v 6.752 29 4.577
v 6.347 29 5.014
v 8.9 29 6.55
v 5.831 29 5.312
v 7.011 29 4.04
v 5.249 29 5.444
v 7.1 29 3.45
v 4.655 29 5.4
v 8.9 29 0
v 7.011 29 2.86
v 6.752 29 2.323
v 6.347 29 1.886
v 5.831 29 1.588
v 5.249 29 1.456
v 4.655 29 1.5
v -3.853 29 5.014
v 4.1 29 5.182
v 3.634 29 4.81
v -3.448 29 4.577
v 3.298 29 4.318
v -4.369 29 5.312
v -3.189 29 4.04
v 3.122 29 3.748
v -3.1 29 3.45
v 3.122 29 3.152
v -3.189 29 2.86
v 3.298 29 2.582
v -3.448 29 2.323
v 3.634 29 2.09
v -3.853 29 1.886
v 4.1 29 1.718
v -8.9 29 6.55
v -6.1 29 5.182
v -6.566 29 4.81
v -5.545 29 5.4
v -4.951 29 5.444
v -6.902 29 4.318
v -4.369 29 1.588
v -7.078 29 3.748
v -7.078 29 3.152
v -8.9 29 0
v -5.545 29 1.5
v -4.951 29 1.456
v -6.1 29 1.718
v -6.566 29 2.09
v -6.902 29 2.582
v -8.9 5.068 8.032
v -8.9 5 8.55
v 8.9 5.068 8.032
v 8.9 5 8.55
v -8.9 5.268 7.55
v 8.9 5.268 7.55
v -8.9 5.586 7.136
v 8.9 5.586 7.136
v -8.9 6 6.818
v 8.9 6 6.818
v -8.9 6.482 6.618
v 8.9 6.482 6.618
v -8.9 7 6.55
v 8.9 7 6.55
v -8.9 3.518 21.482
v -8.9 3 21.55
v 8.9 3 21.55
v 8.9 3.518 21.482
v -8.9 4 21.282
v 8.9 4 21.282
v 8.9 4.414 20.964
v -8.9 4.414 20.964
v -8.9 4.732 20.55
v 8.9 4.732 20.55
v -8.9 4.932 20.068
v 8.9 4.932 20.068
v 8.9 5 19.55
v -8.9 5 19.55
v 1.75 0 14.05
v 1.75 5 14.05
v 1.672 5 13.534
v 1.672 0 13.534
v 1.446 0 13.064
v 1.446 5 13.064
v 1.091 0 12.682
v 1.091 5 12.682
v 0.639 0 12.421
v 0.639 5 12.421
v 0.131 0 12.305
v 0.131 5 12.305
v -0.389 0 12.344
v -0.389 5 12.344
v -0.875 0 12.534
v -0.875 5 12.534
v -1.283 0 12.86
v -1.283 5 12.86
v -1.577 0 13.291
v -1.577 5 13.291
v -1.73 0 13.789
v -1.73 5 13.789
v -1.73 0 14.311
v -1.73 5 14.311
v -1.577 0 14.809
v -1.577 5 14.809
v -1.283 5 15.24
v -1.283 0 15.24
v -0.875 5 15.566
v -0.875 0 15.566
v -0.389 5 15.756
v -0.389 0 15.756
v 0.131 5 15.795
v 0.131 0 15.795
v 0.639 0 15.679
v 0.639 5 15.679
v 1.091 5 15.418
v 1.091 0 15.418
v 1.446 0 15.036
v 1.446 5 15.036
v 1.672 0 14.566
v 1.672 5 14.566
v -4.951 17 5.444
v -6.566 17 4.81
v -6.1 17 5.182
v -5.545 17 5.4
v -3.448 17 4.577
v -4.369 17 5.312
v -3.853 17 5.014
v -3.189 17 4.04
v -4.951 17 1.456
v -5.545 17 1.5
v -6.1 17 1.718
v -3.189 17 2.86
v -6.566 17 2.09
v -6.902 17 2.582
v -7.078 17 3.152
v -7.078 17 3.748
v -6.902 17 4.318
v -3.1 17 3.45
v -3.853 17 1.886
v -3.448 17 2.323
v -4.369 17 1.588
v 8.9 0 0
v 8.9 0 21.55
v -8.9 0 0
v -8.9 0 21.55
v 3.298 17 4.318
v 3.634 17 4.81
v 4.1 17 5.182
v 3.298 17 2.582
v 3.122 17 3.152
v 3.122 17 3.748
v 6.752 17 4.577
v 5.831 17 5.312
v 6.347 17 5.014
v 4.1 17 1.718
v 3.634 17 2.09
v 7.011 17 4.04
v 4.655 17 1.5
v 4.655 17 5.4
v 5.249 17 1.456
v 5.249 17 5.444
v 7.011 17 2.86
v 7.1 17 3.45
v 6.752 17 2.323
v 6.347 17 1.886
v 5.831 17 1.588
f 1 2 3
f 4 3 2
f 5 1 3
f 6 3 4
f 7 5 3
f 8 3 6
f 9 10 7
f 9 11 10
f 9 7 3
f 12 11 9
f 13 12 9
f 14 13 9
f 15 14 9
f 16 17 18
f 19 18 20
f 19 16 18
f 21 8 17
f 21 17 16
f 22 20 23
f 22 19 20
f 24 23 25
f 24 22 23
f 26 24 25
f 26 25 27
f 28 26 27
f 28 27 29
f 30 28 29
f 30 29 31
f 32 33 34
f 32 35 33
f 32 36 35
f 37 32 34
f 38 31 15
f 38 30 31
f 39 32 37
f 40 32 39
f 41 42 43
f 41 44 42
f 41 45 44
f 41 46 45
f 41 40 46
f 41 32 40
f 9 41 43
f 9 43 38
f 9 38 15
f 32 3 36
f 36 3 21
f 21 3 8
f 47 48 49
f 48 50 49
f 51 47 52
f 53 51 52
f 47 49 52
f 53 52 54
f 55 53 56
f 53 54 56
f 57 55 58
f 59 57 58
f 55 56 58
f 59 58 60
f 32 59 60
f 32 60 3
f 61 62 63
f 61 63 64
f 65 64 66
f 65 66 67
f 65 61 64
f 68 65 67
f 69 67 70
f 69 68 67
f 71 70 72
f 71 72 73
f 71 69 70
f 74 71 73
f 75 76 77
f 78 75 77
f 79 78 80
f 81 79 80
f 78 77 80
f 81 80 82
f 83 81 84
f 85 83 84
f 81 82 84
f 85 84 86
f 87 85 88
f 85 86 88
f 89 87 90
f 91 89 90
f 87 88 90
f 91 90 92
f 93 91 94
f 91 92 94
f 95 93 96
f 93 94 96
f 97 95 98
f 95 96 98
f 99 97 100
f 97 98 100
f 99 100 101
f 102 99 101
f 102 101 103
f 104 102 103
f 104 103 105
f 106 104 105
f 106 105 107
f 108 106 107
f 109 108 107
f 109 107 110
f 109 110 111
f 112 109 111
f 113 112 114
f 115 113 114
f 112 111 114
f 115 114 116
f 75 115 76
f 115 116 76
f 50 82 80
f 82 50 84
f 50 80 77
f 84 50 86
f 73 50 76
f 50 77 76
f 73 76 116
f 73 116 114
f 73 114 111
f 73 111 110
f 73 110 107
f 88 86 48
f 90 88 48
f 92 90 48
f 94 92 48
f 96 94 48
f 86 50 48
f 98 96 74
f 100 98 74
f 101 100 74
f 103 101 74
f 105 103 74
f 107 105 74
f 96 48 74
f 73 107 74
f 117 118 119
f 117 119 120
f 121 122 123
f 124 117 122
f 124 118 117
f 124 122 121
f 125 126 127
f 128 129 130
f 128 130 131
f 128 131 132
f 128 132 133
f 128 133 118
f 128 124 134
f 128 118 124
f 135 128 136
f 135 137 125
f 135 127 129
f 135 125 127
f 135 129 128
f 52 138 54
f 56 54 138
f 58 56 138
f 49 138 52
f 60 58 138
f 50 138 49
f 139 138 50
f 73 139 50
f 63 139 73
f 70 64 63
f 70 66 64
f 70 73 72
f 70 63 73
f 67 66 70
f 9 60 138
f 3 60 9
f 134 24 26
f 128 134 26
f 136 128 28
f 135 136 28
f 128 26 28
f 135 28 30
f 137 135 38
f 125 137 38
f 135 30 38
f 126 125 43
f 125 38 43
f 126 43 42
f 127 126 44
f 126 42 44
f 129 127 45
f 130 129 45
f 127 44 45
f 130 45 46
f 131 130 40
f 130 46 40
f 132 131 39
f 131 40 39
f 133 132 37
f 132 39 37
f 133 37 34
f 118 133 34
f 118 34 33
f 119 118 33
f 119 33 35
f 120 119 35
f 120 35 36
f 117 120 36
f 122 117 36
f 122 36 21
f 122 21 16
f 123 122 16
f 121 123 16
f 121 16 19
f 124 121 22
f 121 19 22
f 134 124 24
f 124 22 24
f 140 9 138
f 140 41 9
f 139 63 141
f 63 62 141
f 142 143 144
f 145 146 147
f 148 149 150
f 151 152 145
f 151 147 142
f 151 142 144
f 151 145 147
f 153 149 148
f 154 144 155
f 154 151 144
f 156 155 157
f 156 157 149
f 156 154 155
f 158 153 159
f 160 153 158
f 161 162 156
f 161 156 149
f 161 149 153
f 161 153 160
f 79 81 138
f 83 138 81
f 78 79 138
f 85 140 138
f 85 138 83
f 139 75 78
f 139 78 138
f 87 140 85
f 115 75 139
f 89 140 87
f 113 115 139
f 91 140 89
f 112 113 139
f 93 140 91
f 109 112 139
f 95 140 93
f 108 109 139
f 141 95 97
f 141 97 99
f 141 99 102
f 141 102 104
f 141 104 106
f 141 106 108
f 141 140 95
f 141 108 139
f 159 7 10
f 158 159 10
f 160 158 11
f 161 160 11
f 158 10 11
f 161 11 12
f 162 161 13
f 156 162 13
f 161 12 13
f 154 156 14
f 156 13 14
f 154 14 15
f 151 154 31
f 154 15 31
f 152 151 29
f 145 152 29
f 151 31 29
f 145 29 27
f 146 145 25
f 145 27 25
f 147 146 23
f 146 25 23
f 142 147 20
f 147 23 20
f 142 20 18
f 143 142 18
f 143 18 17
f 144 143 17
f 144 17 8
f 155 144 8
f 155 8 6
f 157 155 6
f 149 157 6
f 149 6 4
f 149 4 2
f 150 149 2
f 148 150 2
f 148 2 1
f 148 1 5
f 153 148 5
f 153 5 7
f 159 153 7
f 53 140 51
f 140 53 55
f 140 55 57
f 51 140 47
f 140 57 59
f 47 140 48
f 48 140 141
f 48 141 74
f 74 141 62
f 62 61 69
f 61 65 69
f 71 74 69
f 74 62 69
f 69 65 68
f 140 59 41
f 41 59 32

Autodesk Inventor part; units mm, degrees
ref_plane "YZ Plane" through (0, 0, 0) normal (1, 0, 0) x (0, 1, 0)
ref_plane "XZ Plane" through (0, 0, 0) normal (0, 1, 0) x (-1, 0, 0)
ref_plane "XY Plane" through (0, 0, 0) normal (0, 0, 1) x (1, 0, 0)
sketch "Boceto1" plane through (0, 0, 0) normal (1, 0, 0) x (0, 1, 0)
  line L0 (27, 0) -> (0, 0)
  line L1 (0, 0) -> (0, 6.55)
  line L2 (0, 6.55) -> (27, 6.55)
  line L3 (27, 6.55) -> (27, 0)
  line L4 (0, 6.55) -> (5, 6.55)
  line L5 (5, 6.55) -> (5, 21.55)
  line L6 (5, 21.55) -> (0, 21.55)
  line L7 (0, 21.55) -> (0, 6.55)
  dimension "d0" = 27
  dimension "d1" = 6.55
  dimension "d2" = 15
  dimension "d3" = 5
extrude "Extrusión1" add sketch "Boceto1" along normal mid plane 17.8
sketch "Boceto4" plane through (-8.9, 5, 21.55) normal (0, 1, 0) x (1, 0, 0)
  point P0 (8.9, 21.55)
sketch "Boceto5" plane through (-8.9, 27, 6.55) normal (0, 1, 0) x (1, 0, 0)
  circle A0 centre (3.8, 3.1) radius 2
  circle A1 centre (14, 3.1) radius 2
  line L0 (0, 0) -> (17.8, 0) projected
  line L1 (0, 0) -> (0, 6.55) projected
  line L2 (17.8, 6.55) -> (17.8, 0) projected
  point P0 (8.9, 6.55)
  dimension "d10" = 4
  dimension "d11" = 4
  dimension "d12" = 3.1
  dimension "d13" = 3.8
  dimension "d14" = 3.8
extrude "Extrusión3" cut sketch "Boceto5" against normal blind 10
sketch "Boceto6" plane through (-8.9, 5, 21.55) normal (0, 1, 0) x (1, 0, 0)
  circle A0 centre (8.9, 7.5) radius 1.75
  line L0 (0, 0) -> (0, 15) projected
  line L1 (0, 0) -> (17.8, 0) projected
  point P0 (8.9, 21.55)
  point P1 (0, 7.5)
  point P2 (8.9, 0)
  dimension "d17" = 3.5
extrude "Extrusión4" cut sketch "Boceto6" against normal blind 10
fillet "Empalme1" radius 2 1 edges at (0, 5, 6.55)
fillet "Empalme2" radius 2 1 edges at (0, 5, 21.55)
move faces "Desplazar1" translate (0, 2, 0) faces at (1.6196, 27, 0.4882)
equation "\"d11\" = d10"
equation "\"d14\" = d13"
properties part number "Sujeción de servo a mesa s-c" material "Plástico PC/ABS"
